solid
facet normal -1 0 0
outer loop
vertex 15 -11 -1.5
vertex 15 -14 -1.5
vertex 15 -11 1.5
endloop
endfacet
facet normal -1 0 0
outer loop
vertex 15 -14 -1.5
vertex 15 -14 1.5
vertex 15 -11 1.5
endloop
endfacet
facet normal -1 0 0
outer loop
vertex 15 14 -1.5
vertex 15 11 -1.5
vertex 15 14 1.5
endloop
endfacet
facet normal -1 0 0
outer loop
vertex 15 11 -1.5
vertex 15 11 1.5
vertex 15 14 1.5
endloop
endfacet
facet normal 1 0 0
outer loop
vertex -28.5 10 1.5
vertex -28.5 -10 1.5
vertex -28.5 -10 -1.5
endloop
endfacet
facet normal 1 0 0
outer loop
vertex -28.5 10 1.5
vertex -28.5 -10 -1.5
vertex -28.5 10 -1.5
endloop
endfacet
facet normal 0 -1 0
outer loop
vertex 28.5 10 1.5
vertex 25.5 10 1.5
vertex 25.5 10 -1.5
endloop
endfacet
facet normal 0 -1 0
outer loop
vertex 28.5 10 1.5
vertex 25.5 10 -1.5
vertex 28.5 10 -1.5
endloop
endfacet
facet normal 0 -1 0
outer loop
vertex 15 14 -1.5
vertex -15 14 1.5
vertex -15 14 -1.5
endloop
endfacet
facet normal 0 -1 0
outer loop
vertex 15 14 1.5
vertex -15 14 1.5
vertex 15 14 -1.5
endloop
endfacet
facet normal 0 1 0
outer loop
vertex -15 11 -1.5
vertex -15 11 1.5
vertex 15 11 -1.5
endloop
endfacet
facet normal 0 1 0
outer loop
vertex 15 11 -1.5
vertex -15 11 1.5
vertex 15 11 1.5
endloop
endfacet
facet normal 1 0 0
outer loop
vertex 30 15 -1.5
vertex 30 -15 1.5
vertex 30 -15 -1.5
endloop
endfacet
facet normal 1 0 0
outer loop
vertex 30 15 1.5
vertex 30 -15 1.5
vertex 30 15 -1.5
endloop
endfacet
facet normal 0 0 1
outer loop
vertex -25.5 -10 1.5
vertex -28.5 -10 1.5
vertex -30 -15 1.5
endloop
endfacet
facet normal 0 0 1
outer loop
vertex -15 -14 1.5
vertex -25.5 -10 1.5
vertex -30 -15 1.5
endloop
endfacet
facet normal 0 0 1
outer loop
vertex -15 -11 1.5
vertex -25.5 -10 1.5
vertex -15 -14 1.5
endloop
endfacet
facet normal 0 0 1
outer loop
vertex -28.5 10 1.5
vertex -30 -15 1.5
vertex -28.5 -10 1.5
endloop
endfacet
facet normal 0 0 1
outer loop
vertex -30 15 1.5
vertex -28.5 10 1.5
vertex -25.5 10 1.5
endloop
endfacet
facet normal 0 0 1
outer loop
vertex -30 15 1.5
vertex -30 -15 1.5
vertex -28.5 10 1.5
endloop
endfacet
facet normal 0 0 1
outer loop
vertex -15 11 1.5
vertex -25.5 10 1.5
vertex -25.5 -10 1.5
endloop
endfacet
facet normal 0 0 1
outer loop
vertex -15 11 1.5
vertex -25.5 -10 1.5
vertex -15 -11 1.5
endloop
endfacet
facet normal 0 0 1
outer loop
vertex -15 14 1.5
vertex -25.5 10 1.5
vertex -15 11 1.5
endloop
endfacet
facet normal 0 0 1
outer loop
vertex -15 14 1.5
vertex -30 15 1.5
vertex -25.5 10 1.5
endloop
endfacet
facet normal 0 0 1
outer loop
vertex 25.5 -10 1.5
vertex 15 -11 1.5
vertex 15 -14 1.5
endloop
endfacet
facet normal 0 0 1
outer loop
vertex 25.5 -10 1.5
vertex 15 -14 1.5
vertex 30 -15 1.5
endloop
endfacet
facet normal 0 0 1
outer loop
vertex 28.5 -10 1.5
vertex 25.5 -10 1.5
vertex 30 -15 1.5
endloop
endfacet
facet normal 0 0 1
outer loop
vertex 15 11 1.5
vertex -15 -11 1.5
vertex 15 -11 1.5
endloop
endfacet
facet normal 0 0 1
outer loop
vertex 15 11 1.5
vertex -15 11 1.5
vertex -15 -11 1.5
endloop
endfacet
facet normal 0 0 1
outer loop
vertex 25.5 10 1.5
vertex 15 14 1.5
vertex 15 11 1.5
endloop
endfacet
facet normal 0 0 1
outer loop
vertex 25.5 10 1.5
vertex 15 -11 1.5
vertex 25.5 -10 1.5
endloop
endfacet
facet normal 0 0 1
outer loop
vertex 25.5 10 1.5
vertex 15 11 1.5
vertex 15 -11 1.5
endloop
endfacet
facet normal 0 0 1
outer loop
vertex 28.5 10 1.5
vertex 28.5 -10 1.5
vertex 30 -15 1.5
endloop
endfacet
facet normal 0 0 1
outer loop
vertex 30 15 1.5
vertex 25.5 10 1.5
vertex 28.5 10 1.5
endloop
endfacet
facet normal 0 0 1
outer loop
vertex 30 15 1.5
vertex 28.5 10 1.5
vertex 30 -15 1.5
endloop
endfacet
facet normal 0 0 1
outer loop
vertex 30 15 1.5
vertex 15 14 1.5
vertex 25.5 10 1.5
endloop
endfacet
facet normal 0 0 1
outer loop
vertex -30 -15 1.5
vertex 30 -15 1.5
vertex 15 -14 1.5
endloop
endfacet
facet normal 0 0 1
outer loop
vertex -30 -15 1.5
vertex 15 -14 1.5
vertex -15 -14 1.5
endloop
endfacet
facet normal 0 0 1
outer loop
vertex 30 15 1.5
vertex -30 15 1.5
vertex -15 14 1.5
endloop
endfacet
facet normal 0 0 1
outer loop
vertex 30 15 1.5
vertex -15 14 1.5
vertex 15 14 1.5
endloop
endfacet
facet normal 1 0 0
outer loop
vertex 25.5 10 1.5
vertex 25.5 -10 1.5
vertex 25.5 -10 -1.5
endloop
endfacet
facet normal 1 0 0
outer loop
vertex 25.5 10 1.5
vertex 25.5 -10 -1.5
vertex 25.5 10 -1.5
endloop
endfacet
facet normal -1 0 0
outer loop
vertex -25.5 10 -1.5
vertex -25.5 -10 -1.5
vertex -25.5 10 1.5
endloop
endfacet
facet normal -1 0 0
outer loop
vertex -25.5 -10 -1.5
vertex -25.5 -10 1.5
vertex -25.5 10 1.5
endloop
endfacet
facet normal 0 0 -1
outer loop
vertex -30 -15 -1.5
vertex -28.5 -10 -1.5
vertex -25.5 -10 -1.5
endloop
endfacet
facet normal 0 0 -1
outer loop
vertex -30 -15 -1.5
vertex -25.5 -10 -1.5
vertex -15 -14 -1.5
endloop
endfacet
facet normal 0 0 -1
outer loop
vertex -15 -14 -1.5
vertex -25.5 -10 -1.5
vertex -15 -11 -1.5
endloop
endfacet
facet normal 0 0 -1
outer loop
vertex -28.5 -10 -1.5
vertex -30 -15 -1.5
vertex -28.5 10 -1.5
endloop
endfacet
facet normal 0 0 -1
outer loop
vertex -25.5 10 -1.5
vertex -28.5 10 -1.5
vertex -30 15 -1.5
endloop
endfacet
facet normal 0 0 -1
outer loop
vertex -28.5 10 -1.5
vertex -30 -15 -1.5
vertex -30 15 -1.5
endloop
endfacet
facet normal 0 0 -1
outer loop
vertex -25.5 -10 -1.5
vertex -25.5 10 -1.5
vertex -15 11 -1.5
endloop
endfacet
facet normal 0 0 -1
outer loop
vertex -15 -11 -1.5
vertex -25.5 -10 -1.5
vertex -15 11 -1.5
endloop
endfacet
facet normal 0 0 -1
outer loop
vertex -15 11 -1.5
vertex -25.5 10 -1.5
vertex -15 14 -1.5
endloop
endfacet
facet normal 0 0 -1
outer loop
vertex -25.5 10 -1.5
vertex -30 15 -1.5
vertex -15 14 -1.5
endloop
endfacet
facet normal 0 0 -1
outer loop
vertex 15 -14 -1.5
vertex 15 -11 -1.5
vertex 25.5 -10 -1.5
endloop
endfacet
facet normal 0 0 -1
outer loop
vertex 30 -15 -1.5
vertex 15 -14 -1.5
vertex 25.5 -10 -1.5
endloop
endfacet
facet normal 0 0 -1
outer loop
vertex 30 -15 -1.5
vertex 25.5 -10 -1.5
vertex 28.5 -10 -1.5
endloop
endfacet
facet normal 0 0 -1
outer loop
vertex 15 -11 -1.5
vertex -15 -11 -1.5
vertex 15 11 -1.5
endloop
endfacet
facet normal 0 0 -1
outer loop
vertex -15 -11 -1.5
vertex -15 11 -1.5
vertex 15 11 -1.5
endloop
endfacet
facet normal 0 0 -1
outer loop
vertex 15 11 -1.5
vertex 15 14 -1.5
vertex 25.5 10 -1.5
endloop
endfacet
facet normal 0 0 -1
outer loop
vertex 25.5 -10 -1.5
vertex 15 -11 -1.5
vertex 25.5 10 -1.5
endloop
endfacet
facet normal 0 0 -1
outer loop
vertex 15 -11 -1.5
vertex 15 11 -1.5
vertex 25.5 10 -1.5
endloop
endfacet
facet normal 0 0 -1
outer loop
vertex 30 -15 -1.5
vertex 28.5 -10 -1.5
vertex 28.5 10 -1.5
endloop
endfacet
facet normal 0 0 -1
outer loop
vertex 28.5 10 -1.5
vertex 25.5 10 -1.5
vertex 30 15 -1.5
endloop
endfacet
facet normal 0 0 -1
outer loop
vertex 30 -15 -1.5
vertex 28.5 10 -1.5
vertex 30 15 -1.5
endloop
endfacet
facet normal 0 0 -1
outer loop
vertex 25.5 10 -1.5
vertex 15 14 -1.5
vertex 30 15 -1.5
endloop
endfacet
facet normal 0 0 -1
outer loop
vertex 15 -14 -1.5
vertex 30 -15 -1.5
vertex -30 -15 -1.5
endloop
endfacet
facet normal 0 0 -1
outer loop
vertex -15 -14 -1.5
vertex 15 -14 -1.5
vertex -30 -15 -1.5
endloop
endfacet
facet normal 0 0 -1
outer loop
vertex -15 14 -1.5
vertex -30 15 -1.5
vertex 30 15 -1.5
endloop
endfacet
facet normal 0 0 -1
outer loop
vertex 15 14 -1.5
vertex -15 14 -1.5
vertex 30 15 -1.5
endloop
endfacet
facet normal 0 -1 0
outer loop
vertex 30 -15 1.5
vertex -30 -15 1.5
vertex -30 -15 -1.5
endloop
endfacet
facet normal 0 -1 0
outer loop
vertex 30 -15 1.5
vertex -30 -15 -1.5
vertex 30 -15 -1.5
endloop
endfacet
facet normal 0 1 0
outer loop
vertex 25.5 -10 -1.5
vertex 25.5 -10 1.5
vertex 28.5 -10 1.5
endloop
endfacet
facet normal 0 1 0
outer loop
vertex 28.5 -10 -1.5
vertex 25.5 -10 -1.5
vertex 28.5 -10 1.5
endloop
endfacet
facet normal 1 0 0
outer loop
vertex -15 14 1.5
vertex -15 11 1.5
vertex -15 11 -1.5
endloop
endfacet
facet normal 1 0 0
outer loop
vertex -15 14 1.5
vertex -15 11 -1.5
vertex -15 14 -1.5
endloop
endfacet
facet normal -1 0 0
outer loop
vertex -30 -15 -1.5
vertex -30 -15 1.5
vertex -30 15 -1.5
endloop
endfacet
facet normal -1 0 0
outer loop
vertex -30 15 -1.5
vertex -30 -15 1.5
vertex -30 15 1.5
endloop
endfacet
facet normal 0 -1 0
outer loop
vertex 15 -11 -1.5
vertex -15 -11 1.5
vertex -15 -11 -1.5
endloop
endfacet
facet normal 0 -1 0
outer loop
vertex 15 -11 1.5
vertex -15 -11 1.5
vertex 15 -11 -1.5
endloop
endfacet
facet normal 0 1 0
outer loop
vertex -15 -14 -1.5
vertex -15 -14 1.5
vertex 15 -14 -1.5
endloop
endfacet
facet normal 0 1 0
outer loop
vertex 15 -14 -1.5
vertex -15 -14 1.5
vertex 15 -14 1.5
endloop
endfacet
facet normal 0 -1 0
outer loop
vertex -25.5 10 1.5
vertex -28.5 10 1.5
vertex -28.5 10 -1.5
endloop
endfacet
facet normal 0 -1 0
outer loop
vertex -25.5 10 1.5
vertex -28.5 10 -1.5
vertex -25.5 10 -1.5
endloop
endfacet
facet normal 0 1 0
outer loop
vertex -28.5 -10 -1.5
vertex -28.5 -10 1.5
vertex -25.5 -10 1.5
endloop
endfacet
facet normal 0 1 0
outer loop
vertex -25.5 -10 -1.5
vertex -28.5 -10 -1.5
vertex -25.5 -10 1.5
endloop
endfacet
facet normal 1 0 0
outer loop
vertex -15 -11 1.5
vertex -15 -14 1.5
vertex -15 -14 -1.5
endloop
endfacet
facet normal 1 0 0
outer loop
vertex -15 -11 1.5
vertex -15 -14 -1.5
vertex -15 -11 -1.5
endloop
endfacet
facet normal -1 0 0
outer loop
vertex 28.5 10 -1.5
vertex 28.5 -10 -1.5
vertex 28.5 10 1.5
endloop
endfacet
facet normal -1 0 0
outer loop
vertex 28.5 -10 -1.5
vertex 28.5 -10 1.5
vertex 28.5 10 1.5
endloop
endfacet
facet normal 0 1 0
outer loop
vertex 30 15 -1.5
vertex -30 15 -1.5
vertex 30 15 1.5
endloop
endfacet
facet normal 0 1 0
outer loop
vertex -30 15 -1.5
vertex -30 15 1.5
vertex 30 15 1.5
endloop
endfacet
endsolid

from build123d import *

# Parameters (mm, degrees)
SKETCH1_W           = 60
SKETCH1_H           = 30
SKETCH1_W_2         = 3
SKETCH1_H_2         = 20
SKETCH1_W_3         = 30
SKETCH1_H_3         = 3
BOSS_EXTRUDE1_DEPTH = 1.5


with BuildPart() as part:
    # Sketch1 → Boss-Extrude1 (new body, symmetric)
    with BuildSketch(Plane.XY):
        Rectangle(SKETCH1_W, SKETCH1_H)
        with Locations((-27, 0)):
            Rectangle(SKETCH1_W_2, SKETCH1_H_2, mode=Mode.SUBTRACT)
        with Locations((27, 0)):
            Rectangle(SKETCH1_W_2, SKETCH1_H_2, mode=Mode.SUBTRACT)
        with Locations((0, 12.5)):
            Rectangle(SKETCH1_W_3, SKETCH1_H_3, mode=Mode.SUBTRACT)
        with Locations((0, -12.5)):
            Rectangle(SKETCH1_W_3, SKETCH1_H_3, mode=Mode.SUBTRACT)
    extrude(amount=BOSS_EXTRUDE1_DEPTH, both=True)


solid = part.part
